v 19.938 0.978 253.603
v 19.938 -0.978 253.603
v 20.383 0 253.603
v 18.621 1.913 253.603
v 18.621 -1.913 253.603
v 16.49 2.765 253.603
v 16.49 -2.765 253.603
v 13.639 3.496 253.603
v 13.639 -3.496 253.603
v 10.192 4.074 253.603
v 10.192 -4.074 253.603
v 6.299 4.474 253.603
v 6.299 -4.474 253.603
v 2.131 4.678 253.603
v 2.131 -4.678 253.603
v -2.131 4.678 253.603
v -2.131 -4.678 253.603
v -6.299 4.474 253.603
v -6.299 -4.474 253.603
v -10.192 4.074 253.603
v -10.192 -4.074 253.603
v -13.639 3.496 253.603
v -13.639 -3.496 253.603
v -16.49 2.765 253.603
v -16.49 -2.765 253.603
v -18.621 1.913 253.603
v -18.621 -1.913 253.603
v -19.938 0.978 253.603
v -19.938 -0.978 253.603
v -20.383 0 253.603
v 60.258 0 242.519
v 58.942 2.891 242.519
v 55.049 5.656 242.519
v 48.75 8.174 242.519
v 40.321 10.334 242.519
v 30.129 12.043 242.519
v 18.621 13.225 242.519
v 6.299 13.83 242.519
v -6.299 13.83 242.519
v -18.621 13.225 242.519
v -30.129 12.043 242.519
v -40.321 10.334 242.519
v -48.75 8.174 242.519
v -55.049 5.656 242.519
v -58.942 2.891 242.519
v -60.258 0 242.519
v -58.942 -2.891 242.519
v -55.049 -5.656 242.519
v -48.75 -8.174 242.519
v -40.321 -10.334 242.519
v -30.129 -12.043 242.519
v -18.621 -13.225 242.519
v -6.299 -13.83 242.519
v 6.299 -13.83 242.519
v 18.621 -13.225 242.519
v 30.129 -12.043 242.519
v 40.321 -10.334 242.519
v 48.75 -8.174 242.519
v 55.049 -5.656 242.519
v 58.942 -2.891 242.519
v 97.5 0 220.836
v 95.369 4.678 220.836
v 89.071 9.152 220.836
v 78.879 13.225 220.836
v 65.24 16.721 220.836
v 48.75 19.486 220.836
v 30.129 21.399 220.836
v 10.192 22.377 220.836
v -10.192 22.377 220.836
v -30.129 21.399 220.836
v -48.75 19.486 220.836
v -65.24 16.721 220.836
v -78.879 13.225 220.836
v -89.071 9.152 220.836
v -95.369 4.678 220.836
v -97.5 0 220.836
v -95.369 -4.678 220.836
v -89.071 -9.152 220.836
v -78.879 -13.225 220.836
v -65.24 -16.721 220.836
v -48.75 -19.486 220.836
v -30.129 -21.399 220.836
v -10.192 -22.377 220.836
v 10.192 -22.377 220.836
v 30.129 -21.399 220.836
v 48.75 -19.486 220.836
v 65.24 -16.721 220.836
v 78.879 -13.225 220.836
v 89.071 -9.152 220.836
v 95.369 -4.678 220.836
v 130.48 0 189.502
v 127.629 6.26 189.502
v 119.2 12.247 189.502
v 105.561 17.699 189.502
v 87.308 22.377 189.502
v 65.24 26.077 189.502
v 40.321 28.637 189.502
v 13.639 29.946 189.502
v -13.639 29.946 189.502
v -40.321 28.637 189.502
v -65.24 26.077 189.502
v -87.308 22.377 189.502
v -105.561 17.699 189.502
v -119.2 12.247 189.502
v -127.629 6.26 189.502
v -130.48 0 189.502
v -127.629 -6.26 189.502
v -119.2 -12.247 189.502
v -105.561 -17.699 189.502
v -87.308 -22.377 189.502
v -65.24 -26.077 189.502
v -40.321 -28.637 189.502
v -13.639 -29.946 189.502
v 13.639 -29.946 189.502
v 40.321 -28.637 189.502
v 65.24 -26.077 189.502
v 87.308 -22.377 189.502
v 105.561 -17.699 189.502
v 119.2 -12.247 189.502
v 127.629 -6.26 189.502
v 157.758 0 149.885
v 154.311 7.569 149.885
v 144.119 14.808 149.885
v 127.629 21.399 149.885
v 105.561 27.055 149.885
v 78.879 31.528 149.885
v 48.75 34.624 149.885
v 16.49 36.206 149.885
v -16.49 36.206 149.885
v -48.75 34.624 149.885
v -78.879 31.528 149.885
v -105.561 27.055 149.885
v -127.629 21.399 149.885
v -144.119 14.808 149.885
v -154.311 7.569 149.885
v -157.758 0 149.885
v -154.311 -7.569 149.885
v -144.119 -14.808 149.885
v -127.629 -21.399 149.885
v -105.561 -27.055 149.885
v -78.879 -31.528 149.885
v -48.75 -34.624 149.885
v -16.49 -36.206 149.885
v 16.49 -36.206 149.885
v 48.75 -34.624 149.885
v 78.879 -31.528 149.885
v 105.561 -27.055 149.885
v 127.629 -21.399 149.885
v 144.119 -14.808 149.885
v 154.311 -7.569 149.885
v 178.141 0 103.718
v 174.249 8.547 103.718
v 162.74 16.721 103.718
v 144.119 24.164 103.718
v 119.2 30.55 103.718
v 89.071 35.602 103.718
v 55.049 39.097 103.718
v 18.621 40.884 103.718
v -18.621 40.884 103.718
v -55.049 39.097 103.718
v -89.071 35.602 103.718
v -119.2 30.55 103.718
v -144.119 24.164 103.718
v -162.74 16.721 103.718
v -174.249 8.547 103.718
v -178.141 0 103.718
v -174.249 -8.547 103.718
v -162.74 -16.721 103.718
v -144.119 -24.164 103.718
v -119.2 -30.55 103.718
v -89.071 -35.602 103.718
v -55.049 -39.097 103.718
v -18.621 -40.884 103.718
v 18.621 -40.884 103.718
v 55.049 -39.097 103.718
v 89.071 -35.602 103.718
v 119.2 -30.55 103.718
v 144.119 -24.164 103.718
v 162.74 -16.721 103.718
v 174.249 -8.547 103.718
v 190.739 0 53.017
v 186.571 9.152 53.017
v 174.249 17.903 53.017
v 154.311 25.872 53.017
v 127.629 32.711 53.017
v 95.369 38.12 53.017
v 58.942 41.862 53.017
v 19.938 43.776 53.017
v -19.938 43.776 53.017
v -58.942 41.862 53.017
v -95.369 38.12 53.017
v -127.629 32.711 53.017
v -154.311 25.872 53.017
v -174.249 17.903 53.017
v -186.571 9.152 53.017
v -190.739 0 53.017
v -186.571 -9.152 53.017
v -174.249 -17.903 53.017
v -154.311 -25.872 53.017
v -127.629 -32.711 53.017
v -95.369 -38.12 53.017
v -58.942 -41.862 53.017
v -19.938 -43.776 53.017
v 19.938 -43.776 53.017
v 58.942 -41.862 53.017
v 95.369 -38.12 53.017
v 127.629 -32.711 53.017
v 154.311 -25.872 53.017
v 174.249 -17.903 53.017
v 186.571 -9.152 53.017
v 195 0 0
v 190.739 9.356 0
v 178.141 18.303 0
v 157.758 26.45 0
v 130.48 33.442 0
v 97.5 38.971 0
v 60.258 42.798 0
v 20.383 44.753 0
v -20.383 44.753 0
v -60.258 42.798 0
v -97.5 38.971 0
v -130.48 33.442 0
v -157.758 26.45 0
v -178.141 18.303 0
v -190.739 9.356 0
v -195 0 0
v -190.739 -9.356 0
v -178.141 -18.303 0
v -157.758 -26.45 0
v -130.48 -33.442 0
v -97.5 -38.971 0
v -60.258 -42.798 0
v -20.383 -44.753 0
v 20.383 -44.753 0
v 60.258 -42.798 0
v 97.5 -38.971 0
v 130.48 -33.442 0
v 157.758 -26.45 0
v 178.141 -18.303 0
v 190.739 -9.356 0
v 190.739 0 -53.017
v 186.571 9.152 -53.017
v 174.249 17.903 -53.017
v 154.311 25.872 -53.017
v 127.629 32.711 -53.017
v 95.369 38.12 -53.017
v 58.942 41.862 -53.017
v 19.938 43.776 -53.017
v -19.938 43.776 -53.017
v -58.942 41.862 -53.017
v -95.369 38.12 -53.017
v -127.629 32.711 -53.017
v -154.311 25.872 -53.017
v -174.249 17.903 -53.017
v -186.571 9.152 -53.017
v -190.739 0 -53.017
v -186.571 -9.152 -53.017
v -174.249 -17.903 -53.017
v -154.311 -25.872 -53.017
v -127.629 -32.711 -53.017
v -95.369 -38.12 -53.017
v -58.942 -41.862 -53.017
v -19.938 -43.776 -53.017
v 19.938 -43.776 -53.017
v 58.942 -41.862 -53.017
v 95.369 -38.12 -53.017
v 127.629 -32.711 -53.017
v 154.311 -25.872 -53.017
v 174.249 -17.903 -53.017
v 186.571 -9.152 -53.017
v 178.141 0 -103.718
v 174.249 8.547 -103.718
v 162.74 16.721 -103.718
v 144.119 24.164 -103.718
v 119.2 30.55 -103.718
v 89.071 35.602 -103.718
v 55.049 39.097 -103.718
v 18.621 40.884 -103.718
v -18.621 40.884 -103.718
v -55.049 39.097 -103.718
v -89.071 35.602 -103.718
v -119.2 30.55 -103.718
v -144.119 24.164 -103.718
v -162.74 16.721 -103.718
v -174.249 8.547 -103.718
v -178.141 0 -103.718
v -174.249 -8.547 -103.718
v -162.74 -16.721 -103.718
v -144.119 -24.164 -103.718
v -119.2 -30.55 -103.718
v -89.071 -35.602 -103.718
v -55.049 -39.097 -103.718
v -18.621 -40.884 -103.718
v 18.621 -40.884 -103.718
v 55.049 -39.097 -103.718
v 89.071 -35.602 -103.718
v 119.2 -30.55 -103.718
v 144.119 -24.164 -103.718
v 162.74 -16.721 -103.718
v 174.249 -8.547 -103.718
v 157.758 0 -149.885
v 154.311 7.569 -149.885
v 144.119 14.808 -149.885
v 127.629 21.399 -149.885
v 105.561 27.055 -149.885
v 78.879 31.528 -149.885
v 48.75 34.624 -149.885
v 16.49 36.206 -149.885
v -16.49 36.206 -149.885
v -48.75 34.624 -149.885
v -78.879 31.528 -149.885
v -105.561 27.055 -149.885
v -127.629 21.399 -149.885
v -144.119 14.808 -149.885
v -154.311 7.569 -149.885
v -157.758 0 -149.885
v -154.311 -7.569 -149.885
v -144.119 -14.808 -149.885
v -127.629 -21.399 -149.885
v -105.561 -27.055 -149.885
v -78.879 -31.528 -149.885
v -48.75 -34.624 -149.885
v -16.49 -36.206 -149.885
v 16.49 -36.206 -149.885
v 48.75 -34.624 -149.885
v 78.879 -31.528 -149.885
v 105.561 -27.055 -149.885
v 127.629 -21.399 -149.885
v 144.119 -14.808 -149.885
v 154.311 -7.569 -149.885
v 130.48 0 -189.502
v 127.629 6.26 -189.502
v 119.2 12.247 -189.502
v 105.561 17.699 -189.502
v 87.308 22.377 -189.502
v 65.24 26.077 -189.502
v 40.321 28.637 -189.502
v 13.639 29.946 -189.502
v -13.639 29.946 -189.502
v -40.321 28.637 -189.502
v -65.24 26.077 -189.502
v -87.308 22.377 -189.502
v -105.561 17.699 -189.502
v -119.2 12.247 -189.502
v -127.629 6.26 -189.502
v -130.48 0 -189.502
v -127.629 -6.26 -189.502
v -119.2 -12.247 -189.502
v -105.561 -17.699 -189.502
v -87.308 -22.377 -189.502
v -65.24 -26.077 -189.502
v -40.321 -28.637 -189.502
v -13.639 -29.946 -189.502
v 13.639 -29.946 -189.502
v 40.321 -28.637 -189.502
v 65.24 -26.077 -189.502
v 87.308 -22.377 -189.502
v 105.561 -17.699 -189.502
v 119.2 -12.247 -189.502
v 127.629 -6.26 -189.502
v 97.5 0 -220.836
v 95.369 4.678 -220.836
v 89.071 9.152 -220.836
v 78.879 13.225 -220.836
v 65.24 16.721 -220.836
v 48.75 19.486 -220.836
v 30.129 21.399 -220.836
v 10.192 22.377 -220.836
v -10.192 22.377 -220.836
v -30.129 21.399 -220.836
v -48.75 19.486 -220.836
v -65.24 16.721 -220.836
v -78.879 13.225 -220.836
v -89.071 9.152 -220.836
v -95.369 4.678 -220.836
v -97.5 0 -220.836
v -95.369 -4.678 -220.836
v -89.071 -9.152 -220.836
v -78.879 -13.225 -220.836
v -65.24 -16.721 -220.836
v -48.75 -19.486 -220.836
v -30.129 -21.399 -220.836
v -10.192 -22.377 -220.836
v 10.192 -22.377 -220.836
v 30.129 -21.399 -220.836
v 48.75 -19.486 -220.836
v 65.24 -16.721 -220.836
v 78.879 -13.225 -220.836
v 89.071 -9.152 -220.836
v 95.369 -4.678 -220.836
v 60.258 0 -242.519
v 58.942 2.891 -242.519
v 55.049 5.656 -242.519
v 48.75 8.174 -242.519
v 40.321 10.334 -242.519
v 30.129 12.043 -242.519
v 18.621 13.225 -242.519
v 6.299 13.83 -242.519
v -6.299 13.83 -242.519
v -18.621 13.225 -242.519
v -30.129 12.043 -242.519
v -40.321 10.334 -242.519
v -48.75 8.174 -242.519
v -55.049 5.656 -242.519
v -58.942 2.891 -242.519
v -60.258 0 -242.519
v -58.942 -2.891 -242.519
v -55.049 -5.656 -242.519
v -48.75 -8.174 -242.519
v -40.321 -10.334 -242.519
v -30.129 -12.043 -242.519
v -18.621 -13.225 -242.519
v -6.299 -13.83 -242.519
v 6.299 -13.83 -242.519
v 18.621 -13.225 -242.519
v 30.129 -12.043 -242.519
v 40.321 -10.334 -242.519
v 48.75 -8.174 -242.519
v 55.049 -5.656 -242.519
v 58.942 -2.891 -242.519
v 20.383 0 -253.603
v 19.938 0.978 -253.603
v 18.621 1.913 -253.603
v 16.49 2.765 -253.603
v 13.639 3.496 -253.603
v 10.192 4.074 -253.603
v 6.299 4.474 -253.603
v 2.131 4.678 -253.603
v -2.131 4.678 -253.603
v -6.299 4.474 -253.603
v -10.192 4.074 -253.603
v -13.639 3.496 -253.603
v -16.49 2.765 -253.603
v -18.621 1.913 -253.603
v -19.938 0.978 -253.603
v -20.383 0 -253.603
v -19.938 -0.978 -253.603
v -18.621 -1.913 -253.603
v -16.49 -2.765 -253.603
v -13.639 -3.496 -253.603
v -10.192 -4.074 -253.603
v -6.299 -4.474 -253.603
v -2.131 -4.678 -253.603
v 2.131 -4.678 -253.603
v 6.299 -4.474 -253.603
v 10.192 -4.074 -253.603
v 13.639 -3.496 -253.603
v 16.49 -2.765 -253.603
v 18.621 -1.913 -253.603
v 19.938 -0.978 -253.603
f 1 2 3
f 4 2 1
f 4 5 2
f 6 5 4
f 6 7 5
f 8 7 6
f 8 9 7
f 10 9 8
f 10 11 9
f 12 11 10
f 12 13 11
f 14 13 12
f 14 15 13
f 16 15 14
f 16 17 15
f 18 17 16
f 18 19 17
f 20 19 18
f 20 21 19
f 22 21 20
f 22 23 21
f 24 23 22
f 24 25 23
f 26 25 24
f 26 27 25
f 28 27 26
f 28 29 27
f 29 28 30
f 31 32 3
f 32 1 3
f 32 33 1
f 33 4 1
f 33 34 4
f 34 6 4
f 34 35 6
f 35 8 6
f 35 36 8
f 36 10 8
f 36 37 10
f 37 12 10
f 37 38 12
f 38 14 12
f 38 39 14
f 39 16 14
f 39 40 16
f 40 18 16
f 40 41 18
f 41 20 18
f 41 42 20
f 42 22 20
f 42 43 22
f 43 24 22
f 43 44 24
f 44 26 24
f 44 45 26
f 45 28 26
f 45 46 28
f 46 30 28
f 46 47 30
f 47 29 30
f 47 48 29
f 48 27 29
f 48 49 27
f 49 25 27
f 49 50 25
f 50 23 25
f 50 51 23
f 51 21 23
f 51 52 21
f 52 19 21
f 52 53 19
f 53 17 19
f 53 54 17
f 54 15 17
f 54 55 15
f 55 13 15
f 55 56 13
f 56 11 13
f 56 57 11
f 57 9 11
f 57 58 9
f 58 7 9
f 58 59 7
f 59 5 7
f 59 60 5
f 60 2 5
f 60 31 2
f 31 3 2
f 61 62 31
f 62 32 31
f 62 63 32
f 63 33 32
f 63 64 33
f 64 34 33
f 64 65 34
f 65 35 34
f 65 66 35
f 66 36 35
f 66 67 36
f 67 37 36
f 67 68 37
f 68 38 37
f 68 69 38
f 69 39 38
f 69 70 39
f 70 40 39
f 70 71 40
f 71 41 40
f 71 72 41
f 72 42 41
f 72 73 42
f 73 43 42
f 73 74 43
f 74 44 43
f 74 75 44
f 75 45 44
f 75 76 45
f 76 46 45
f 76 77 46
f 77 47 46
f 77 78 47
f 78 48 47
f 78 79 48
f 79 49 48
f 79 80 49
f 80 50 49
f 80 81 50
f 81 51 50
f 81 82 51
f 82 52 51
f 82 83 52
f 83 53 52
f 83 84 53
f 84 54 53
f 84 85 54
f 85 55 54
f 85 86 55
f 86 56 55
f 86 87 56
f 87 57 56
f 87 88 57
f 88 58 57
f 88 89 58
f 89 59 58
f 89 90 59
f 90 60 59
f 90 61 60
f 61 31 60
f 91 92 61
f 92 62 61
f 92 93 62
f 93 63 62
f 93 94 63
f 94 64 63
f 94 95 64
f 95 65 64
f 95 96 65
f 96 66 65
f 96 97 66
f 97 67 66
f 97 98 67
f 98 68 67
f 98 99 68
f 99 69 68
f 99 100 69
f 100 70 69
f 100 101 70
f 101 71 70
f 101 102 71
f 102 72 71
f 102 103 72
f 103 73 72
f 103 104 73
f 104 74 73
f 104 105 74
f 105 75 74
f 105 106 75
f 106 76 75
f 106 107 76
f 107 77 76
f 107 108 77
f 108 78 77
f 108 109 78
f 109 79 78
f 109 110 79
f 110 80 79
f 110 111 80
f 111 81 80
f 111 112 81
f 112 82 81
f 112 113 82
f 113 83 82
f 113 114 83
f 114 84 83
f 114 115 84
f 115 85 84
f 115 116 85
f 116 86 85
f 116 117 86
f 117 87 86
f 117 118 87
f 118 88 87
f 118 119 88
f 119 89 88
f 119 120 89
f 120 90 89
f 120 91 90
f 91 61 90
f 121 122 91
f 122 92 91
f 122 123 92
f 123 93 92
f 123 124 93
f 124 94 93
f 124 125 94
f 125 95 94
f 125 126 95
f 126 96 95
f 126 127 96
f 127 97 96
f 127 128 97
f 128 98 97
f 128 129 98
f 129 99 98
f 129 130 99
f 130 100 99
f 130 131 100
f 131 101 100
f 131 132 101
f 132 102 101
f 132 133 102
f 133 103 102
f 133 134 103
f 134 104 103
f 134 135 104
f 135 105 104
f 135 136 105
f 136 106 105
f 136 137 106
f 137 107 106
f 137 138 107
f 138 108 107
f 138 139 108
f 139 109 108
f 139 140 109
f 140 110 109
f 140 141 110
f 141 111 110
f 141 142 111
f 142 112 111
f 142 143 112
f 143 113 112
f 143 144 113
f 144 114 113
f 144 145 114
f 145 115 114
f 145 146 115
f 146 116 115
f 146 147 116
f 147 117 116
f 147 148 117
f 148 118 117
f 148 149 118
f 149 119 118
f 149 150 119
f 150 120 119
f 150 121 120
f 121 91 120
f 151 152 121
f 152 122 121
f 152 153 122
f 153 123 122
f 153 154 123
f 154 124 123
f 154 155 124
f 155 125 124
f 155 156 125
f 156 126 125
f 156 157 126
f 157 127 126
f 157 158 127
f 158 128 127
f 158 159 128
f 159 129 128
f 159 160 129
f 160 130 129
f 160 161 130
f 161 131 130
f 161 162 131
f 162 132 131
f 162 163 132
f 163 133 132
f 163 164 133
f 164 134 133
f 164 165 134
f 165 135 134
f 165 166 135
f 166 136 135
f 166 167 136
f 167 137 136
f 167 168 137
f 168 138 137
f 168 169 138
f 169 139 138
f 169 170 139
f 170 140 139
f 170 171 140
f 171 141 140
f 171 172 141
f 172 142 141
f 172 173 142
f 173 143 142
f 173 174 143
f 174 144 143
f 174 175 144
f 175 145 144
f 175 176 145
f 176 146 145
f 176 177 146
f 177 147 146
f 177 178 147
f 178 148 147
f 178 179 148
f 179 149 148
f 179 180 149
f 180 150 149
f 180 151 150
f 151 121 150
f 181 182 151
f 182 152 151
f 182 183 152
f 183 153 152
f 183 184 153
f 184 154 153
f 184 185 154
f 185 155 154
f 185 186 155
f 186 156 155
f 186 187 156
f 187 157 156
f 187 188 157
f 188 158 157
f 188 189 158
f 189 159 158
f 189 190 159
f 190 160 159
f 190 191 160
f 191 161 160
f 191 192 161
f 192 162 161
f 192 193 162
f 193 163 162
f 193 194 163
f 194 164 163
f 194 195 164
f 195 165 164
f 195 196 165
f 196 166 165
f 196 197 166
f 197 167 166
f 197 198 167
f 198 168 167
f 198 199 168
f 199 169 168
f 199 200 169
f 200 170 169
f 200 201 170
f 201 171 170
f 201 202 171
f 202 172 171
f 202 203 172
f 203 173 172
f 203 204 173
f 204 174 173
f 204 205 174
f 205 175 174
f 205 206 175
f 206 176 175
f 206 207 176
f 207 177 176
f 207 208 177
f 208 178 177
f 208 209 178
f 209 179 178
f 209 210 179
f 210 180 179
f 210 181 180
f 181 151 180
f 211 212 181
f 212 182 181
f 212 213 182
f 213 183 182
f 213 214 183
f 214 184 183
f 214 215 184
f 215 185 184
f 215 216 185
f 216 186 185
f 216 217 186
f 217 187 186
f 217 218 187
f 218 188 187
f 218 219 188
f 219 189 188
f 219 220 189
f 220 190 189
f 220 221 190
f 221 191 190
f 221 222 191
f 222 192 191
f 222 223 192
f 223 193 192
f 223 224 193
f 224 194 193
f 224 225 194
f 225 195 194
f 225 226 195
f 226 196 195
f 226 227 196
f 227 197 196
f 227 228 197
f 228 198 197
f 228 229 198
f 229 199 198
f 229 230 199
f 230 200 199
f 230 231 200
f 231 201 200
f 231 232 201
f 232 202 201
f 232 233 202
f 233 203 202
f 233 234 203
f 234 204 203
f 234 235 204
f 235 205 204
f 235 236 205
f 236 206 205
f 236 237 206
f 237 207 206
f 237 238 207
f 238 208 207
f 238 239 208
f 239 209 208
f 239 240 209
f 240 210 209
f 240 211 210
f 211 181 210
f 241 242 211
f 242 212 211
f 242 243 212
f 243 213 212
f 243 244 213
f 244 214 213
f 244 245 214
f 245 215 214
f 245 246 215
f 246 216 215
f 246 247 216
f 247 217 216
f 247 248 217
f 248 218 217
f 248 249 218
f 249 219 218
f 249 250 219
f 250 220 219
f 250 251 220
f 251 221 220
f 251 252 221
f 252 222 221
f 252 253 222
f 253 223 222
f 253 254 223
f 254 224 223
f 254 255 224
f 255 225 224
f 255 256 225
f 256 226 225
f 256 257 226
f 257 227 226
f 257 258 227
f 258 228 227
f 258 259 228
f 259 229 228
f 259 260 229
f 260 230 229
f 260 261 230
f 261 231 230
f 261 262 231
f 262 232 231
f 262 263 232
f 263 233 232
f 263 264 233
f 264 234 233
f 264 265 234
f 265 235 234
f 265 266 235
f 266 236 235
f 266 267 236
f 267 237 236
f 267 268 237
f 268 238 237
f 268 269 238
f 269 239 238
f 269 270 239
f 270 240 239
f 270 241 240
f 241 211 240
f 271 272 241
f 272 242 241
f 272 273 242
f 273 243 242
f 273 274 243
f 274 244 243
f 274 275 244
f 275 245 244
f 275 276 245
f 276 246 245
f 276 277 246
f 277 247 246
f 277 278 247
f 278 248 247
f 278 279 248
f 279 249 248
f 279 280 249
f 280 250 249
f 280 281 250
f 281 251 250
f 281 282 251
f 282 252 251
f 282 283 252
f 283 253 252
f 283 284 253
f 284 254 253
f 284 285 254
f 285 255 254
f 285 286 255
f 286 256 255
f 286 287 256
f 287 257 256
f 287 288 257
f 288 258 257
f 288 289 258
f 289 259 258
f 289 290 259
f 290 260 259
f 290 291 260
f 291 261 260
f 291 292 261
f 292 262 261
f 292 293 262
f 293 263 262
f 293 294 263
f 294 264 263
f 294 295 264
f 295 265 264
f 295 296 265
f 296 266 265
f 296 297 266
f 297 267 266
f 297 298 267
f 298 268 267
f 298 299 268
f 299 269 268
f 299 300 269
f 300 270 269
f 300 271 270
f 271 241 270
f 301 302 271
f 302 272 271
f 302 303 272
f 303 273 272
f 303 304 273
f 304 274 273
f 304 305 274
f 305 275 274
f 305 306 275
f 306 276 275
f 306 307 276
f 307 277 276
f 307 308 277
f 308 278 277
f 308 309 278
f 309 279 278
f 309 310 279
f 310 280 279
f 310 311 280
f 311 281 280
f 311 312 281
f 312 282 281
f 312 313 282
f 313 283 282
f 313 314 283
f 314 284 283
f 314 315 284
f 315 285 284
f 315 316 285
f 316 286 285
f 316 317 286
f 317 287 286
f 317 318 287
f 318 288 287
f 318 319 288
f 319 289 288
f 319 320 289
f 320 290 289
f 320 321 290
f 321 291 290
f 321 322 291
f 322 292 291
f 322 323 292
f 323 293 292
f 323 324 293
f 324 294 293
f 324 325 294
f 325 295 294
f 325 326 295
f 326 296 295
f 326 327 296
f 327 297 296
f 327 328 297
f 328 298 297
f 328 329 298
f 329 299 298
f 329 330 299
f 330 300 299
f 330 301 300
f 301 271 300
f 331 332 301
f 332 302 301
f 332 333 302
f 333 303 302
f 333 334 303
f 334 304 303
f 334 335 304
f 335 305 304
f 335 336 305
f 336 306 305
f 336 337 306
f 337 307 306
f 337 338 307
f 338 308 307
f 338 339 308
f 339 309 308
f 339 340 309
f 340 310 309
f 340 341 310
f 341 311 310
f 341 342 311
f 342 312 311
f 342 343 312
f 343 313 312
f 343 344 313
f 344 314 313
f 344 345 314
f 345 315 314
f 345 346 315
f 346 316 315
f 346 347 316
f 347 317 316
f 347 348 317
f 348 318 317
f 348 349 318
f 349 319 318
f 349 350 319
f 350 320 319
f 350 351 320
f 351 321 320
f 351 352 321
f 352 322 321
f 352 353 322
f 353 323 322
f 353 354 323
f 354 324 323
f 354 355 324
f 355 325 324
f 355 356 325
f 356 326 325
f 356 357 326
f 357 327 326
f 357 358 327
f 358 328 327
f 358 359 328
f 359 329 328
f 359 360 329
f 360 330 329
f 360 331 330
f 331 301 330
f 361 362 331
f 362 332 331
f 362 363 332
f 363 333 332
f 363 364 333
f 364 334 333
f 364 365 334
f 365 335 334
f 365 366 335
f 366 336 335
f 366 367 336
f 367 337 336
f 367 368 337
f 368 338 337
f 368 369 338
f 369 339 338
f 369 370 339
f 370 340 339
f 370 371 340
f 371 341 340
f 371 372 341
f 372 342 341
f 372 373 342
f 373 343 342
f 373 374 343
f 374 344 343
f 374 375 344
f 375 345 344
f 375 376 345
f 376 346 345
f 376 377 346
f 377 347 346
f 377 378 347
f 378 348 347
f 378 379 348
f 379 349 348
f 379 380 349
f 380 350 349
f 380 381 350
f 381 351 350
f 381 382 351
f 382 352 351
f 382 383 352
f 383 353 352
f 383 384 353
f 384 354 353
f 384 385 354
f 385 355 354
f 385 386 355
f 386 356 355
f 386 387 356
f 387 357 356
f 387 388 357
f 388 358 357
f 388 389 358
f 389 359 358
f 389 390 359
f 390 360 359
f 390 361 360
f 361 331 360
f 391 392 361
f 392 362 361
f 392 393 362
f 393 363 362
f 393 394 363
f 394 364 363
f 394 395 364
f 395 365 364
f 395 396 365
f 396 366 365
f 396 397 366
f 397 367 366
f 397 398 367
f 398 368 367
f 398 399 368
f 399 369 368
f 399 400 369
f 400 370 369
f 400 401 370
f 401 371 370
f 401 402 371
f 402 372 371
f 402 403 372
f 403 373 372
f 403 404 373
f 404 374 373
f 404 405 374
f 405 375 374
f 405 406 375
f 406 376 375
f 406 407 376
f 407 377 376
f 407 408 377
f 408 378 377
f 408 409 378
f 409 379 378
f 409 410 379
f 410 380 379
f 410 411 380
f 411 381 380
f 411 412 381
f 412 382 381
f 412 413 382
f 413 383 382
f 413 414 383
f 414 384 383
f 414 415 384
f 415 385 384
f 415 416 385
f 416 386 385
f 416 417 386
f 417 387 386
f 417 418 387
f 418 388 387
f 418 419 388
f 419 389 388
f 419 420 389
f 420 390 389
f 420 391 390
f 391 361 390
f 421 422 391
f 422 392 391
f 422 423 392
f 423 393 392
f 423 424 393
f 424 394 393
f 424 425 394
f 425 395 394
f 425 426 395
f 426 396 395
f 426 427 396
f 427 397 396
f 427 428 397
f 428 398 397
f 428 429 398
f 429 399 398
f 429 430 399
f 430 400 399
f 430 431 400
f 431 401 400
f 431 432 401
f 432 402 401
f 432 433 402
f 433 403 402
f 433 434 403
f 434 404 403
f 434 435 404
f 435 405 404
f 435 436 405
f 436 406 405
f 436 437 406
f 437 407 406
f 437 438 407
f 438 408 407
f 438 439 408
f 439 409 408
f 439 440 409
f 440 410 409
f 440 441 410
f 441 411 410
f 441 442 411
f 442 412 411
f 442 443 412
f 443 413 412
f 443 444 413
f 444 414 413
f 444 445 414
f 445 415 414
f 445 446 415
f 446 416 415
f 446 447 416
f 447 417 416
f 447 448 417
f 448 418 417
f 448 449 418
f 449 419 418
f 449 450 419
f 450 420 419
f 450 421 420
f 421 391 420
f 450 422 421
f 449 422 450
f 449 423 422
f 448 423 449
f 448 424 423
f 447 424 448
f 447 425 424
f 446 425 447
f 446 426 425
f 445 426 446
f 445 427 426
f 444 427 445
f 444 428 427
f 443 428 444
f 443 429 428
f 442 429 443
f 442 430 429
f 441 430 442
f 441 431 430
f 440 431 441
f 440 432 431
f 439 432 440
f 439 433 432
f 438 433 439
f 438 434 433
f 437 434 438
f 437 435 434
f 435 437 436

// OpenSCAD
// Generated by SolidPython 1.0.1 on 2020-07-29 00:46:50


scale(v = [13, 3, 17]) {
	sphere(r = 15);
}
/***********************************************
*********      SolidPython code:      **********
************************************************
 
# import packages: SolidPython
from solid import *
from solid.utils import *
from itertools import chain, combinations, permutations


class Resize:

    def __init__(self, scad_file):
        self.scad_file = scad_file
        #self.scad_file = import_scad(scad_file)
        # cone/cylinder param:
        self.r1 = 0
        self.r2 = 0
        self.h = 0
        # rectangular prism param:
        self.w = 0
        self.l = 0
        # ellipse param:
        self.r = 0

    # import OpenScad code (file name corresponds to shape)


    # classify shape + parameters
    def assign(self, param1, param2, param3):
        if self.scad_file == 'cone.scad':
            self.r1 = param1
            self.r2 = param2
            self.h = param3
        elif self.scad_file == 'cylinder.scad':
            self.r1 = param1
            self.r2 = param2
            self.h = param3
        elif self.scad_file == 'rectangularPrism.scad':
            self.h = param1
            self.l = param2
            self.w = param3
        else:
            self.r = param1
            self.h = param2

    # resize parameters
    def iterate(self):
        x = range(3, 20, 2)
        i = 1
        if self.scad_file == 'cone.scad':
            tempList = list(permutations(x, 2))
            for temp in tempList:
                param1 = temp[0]
                param2 = temp[1]
                filepath = 'produced_scad_files/' + 'cone' + str(param1) + '_' + str(param2) + '_' + '.scad'
                scad_render_to_file(cylinder(h=param1, r1=param2, r2=0), filepath)

        elif self.scad_file == 'cylinder.scad':
            tempList = list(permutations(x, 3))
            for temp in tempList:
                param1 = temp[0]
                param2 = temp[1]
                filepath = 'produced_scad_files/' + 'cylinder' + str(param1) + '_' + str(param2) + '_' + '.scad'
                scad_render_to_file(cylinder(h=param1, r1=param2, r2=param2), filepath)

        elif self.scad_file == 'rectangularPrism.scad':
            tempList = list(permutations(x, 3))
            for temp in tempList:
                param1 = temp[0]
                param2 = temp[1]
                param3 = temp[2]
                filepath = 'produced_scad_files/' + 'rectangularPrism' + str(param1) + '_' + str(param2) + '_' + str(
                    param3) + '.scad'
                scad_render_to_file(cube(size=(param1, param2, param3)), filepath)

        elif self.scad_file == 'ellipse.scad':
            tempList = list(permutations(x, 4))
            for temp in tempList:
                param1 = temp[0]
                param2 = temp[1]
                param3 = temp[2]
                param4 = temp[3]
                filepath = 'produced_scad_files/' + 'ellipse' + str(param1) + '_' + str(param2) + '_' + str(param3) + '_' + str(param4) + '.scad'
                scad_render_to_file(scale([param1, param2, param3])(sphere(r=param4)), filepath)

    def render_to_scadfile(self):
        scad_render_to_file(scad, 'example.scad') 
 
************************************************/
